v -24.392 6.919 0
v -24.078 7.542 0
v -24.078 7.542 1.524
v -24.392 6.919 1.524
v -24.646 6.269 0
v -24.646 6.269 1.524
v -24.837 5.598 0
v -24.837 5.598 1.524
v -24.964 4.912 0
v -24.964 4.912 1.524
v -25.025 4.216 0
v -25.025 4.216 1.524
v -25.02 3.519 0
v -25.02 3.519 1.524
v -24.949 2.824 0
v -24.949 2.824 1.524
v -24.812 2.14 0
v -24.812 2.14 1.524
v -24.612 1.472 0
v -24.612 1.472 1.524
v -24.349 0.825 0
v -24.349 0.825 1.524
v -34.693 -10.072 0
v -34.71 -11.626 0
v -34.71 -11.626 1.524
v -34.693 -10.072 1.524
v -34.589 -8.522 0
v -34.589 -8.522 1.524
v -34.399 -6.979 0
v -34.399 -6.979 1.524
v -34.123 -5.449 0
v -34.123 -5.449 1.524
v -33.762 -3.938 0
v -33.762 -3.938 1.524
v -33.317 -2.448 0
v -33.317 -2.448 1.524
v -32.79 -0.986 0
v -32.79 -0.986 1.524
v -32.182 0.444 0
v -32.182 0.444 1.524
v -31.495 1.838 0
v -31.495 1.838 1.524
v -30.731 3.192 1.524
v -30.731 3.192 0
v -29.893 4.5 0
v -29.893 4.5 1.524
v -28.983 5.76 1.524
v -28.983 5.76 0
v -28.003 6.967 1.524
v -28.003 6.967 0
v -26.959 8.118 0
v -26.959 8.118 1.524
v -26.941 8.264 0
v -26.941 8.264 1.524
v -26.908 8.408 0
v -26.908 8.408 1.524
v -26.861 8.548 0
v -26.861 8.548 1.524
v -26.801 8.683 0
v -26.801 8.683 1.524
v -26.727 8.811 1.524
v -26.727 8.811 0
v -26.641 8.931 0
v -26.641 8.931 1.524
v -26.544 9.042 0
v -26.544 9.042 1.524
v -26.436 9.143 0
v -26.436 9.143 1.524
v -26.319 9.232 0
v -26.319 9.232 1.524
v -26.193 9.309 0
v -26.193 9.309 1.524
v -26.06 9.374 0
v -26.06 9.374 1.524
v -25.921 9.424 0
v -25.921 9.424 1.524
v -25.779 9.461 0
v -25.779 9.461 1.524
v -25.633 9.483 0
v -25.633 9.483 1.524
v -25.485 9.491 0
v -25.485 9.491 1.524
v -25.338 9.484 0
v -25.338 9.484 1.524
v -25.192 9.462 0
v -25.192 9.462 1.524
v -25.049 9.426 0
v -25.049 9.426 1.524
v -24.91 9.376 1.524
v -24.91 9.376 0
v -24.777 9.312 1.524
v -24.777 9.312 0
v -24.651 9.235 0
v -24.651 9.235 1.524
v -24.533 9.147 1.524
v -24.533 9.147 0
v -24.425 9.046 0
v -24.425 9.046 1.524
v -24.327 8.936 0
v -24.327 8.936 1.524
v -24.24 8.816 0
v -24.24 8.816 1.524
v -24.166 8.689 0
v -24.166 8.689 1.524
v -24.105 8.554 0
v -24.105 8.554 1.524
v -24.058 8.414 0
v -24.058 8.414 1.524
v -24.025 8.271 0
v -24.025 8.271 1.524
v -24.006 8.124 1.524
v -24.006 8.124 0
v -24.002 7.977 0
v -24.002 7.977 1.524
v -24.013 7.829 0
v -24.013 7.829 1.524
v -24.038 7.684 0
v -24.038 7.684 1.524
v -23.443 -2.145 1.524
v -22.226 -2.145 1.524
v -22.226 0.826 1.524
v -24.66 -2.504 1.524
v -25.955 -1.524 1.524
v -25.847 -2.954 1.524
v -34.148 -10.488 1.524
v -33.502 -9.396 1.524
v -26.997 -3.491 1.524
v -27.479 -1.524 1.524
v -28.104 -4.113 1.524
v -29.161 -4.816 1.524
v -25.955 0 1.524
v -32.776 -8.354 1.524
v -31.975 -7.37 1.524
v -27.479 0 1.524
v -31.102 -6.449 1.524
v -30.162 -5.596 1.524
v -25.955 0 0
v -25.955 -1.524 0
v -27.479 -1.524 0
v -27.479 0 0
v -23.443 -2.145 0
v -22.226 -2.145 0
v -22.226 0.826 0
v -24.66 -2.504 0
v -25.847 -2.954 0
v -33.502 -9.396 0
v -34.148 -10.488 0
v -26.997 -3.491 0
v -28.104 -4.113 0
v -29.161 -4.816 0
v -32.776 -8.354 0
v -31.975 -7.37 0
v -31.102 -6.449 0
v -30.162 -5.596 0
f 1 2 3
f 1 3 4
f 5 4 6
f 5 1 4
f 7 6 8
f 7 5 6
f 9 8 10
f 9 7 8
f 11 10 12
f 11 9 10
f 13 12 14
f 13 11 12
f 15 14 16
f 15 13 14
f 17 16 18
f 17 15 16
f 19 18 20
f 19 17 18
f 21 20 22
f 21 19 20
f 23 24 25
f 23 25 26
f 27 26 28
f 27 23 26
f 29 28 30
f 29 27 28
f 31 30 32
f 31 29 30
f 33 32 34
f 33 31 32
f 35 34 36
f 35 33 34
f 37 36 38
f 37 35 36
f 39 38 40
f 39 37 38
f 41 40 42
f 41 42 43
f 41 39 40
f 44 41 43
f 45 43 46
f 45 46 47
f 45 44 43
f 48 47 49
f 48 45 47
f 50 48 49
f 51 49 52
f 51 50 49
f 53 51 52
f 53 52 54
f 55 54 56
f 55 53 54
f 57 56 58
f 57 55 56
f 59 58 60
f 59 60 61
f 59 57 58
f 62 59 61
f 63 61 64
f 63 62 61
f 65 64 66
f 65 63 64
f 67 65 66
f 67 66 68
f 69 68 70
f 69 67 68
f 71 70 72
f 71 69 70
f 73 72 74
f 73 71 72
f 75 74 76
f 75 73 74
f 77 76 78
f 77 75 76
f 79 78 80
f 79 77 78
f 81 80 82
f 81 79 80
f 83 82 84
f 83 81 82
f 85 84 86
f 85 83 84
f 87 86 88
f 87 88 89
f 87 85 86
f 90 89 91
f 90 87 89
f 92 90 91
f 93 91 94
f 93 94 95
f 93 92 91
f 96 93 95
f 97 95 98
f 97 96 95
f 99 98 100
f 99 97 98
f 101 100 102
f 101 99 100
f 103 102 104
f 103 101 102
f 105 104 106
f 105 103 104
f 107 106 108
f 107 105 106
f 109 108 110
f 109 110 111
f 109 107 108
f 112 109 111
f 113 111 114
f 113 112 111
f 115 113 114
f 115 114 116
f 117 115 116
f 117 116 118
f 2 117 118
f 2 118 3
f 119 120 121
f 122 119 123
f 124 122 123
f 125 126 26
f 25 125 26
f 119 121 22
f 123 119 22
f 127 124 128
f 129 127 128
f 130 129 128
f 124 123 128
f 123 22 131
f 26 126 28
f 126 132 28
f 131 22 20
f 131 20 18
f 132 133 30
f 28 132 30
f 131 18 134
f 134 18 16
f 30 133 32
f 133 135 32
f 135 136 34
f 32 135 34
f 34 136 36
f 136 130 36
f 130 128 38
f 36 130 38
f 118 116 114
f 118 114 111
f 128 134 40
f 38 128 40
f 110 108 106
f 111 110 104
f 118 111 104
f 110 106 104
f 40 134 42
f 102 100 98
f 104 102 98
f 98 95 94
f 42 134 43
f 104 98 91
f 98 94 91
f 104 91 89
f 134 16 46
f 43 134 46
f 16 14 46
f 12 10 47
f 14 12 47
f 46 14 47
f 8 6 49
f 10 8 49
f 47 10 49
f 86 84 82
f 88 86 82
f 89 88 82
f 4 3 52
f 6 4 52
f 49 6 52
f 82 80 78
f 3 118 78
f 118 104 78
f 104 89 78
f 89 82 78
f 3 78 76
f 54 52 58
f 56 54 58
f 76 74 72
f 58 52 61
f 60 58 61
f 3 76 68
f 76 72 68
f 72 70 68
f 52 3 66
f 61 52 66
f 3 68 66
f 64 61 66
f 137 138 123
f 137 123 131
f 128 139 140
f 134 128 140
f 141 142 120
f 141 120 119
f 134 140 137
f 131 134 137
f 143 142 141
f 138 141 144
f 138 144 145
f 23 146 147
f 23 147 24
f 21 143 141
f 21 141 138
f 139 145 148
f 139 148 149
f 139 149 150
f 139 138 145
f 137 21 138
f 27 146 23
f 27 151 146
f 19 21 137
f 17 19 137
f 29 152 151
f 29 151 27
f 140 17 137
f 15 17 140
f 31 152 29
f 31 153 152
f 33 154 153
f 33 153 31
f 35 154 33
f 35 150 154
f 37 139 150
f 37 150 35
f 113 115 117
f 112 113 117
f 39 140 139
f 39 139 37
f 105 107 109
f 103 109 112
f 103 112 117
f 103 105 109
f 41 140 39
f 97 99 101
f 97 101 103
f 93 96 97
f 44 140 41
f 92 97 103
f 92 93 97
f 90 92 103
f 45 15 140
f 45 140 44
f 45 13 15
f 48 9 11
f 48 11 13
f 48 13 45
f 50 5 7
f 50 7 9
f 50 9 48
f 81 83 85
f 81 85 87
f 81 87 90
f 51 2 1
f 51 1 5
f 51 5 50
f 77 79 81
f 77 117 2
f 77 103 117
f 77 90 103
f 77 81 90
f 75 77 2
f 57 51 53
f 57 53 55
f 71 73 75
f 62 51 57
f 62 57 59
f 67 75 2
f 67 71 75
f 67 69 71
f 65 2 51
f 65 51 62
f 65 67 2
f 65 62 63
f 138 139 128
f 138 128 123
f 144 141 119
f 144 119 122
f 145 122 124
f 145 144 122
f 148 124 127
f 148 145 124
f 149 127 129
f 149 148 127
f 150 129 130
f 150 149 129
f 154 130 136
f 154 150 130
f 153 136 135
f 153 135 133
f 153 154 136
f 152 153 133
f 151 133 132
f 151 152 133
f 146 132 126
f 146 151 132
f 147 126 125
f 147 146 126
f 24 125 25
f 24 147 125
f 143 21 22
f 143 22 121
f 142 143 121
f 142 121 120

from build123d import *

# Parameters (mm, degrees)
SKETCH1_W           = 1.524
SKETCH1_H           = 1.524
BOSS_EXTRUDE1_DEPTH = 1.524


with BuildPart() as part:
    # Sketch1 → Boss-Extrude1 (new body)
    with BuildSketch(Plane.XY):
        with BuildLine():
            Line((-22.225726205, -1.524), (-22.225726205, -2.14505284))
            Line((-22.225726205, -2.14505284), (-23.442995373, -2.14505284))
            ThreePointArc((-23.442995373, -2.14505284), (-30.161746406, -5.595987037), (-34.709680239, -11.626481223))
            ThreePointArc((-34.709680239, -11.626481223), (-32.790024922, -0.986396807), (-26.958529189, 8.1180049))
            ThreePointArc((-26.958529189, 8.1180049), (-25.191828644, 9.462219786), (-24.078033866, 7.541905835))
            ThreePointArc((-24.078033866, 7.541905835), (-25.02470469, 4.216402452), (-24.348732091, 0.8255))
            Line((-24.348732091, 0.8255), (-22.225726205, 0.8255))
            Line((-22.225726205, 0.8255), (-22.225726205, -1.524))
        make_face()
        with Locations((-26.716818925, -0.762)):
            Rectangle(SKETCH1_W, SKETCH1_H, mode=Mode.SUBTRACT)
    extrude(amount=BOSS_EXTRUDE1_DEPTH)


solid = part.part
